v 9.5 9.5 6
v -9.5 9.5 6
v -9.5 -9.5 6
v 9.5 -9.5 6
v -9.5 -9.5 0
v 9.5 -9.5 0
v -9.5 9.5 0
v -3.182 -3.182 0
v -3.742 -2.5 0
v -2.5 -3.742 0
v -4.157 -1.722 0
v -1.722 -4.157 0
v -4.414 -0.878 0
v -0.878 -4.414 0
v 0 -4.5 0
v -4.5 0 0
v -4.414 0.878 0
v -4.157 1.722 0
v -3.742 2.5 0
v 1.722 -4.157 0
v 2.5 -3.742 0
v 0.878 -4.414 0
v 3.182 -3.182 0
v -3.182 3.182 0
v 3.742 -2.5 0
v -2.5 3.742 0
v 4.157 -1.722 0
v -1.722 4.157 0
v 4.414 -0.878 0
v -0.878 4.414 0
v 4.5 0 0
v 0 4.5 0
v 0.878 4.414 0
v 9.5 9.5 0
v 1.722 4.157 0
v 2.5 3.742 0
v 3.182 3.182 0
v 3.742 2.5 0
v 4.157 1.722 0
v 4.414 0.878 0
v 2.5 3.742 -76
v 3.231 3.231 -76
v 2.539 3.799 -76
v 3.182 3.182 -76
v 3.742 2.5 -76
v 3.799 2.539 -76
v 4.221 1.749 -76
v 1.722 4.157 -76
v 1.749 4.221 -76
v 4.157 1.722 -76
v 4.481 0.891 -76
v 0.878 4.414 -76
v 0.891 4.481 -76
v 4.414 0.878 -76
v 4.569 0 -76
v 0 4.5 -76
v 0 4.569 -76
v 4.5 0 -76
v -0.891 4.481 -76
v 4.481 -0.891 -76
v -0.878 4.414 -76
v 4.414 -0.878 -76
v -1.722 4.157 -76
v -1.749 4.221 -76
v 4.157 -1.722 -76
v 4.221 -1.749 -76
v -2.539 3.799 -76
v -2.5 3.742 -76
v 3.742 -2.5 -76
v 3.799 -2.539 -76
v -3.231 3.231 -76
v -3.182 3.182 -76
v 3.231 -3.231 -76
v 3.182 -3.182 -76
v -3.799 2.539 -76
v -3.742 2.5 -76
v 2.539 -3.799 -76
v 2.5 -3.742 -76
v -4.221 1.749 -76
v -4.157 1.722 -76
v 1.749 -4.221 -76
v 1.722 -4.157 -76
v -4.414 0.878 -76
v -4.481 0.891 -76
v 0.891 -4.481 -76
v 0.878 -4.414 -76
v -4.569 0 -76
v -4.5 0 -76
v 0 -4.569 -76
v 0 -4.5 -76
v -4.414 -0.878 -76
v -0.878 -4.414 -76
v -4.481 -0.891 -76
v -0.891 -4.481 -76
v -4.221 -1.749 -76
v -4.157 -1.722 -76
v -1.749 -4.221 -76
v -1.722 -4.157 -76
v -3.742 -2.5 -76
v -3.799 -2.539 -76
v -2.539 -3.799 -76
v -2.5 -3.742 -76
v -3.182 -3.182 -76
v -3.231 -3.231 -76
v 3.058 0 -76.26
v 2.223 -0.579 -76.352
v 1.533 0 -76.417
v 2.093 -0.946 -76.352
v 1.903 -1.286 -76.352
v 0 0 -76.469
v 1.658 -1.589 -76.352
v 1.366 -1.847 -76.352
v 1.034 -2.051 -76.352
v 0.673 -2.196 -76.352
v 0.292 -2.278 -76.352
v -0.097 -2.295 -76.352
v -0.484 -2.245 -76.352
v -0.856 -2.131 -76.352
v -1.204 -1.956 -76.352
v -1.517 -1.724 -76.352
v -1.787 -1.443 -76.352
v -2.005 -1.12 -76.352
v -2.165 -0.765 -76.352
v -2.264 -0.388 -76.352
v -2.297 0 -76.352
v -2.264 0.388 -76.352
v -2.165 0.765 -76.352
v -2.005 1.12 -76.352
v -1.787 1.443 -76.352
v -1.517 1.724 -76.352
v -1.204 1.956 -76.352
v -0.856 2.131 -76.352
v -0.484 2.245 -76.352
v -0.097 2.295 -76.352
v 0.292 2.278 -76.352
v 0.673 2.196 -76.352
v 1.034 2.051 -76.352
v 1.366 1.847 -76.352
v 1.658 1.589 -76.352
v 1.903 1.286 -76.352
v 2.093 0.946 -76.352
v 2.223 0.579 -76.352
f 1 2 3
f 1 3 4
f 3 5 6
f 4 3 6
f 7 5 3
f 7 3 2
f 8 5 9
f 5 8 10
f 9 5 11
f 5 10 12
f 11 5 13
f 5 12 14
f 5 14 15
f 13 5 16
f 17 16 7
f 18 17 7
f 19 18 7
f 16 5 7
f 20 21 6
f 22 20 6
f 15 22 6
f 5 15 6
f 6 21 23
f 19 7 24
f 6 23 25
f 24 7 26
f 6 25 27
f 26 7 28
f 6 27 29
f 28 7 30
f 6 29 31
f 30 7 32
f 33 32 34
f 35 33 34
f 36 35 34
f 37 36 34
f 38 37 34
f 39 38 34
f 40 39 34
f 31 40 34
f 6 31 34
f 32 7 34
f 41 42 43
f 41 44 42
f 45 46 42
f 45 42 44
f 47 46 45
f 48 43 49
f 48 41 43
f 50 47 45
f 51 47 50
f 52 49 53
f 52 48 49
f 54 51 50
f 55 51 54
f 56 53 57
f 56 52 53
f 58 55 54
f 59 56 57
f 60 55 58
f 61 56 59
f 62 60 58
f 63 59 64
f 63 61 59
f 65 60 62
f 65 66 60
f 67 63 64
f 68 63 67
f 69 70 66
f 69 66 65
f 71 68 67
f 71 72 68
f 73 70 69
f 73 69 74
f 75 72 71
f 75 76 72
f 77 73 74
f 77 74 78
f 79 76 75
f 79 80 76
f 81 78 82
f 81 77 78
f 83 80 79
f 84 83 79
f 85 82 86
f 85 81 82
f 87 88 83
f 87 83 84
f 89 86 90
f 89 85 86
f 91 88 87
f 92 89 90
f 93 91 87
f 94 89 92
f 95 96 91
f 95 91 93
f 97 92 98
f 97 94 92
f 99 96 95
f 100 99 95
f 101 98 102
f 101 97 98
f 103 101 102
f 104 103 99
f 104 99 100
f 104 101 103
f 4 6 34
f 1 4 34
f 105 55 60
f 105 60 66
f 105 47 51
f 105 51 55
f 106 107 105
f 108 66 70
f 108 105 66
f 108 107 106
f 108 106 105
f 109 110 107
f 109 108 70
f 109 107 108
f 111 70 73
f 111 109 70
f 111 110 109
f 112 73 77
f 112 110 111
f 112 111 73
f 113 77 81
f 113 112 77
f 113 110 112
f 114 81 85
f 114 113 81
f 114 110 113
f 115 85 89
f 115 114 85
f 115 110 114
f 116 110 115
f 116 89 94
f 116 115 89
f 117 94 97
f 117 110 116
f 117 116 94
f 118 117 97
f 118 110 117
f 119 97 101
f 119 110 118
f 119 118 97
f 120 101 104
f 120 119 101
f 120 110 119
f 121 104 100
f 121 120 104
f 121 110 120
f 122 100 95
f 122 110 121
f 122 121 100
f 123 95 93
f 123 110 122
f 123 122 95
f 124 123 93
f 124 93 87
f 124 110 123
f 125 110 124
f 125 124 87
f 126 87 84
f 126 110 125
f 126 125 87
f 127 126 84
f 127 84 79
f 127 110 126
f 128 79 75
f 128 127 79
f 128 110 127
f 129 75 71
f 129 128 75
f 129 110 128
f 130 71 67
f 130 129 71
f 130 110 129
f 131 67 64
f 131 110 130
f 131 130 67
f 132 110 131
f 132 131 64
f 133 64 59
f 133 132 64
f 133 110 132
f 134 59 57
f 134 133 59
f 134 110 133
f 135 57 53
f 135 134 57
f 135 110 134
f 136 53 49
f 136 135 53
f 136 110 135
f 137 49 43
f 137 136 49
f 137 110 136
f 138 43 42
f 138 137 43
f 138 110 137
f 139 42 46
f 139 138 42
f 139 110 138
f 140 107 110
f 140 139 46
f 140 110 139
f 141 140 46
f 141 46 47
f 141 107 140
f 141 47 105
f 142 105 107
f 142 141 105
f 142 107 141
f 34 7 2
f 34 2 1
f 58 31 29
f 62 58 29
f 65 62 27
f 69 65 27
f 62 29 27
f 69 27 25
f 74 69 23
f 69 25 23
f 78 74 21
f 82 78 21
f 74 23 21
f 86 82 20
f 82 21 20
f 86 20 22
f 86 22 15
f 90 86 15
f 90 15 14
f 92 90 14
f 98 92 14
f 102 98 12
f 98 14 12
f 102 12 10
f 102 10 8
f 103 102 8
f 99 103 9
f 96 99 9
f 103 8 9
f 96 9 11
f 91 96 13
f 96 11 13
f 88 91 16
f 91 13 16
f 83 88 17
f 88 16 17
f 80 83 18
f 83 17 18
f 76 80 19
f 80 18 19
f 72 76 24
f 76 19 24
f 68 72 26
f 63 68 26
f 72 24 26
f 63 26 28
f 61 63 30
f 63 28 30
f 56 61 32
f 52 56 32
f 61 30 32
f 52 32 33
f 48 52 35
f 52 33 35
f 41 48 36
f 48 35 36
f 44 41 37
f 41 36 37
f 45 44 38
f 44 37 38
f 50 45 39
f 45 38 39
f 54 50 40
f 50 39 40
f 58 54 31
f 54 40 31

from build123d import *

# Parameters (mm, degrees)
SKETCH2_W           = 19
SKETCH2_H           = 19
BOSS_EXTRUDE1_DEPTH = 6
SKETCH4_R           = 4.5
BOSS_EXTRUDE2_DEPTH = 76


with BuildPart() as part:
    # Sketch2 → Boss-Extrude1 (new body)
    with BuildSketch(Plane.XY):
        Rectangle(SKETCH2_W, SKETCH2_H)
    extrude(amount=BOSS_EXTRUDE1_DEPTH)

    # Sketch4 → Boss-Extrude2 (add)
    with BuildSketch(Plane(origin=(0, 0, 0), x_dir=(-1, 0, 0), z_dir=(0, 0, -1))):
        with Locations(Location((0, 0, 0), (0, 0, 180))):  # turned: the seam where the file's is
            Circle(SKETCH4_R)
    extrude(amount=BOSS_EXTRUDE2_DEPTH)

    # Sketch6 → Revolve2 (revolve)
    with BuildSketch(Plane(origin=(0, 0, 0), x_dir=(0, 0, -1), z_dir=(1, 0, 0)), mode=Mode.PRIVATE) as revolve2_sk:
        with BuildLine():
            Line((76, 0), (76, -4.56928672))
            ThreePointArc((76, -4.56928672), (76.351816001, -2.296672068), (76.469498907, 0))
            Line((76.469498907, 0), (76, 0))
        make_face()
    revolve(revolve2_sk.sketch.rotate(Axis((0, 0, -76), (0, 0, -1)), 270), axis=Axis((0, 0, -76), (0, 0, -1)))  # turned: the seam where the file's is


solid = part.part
